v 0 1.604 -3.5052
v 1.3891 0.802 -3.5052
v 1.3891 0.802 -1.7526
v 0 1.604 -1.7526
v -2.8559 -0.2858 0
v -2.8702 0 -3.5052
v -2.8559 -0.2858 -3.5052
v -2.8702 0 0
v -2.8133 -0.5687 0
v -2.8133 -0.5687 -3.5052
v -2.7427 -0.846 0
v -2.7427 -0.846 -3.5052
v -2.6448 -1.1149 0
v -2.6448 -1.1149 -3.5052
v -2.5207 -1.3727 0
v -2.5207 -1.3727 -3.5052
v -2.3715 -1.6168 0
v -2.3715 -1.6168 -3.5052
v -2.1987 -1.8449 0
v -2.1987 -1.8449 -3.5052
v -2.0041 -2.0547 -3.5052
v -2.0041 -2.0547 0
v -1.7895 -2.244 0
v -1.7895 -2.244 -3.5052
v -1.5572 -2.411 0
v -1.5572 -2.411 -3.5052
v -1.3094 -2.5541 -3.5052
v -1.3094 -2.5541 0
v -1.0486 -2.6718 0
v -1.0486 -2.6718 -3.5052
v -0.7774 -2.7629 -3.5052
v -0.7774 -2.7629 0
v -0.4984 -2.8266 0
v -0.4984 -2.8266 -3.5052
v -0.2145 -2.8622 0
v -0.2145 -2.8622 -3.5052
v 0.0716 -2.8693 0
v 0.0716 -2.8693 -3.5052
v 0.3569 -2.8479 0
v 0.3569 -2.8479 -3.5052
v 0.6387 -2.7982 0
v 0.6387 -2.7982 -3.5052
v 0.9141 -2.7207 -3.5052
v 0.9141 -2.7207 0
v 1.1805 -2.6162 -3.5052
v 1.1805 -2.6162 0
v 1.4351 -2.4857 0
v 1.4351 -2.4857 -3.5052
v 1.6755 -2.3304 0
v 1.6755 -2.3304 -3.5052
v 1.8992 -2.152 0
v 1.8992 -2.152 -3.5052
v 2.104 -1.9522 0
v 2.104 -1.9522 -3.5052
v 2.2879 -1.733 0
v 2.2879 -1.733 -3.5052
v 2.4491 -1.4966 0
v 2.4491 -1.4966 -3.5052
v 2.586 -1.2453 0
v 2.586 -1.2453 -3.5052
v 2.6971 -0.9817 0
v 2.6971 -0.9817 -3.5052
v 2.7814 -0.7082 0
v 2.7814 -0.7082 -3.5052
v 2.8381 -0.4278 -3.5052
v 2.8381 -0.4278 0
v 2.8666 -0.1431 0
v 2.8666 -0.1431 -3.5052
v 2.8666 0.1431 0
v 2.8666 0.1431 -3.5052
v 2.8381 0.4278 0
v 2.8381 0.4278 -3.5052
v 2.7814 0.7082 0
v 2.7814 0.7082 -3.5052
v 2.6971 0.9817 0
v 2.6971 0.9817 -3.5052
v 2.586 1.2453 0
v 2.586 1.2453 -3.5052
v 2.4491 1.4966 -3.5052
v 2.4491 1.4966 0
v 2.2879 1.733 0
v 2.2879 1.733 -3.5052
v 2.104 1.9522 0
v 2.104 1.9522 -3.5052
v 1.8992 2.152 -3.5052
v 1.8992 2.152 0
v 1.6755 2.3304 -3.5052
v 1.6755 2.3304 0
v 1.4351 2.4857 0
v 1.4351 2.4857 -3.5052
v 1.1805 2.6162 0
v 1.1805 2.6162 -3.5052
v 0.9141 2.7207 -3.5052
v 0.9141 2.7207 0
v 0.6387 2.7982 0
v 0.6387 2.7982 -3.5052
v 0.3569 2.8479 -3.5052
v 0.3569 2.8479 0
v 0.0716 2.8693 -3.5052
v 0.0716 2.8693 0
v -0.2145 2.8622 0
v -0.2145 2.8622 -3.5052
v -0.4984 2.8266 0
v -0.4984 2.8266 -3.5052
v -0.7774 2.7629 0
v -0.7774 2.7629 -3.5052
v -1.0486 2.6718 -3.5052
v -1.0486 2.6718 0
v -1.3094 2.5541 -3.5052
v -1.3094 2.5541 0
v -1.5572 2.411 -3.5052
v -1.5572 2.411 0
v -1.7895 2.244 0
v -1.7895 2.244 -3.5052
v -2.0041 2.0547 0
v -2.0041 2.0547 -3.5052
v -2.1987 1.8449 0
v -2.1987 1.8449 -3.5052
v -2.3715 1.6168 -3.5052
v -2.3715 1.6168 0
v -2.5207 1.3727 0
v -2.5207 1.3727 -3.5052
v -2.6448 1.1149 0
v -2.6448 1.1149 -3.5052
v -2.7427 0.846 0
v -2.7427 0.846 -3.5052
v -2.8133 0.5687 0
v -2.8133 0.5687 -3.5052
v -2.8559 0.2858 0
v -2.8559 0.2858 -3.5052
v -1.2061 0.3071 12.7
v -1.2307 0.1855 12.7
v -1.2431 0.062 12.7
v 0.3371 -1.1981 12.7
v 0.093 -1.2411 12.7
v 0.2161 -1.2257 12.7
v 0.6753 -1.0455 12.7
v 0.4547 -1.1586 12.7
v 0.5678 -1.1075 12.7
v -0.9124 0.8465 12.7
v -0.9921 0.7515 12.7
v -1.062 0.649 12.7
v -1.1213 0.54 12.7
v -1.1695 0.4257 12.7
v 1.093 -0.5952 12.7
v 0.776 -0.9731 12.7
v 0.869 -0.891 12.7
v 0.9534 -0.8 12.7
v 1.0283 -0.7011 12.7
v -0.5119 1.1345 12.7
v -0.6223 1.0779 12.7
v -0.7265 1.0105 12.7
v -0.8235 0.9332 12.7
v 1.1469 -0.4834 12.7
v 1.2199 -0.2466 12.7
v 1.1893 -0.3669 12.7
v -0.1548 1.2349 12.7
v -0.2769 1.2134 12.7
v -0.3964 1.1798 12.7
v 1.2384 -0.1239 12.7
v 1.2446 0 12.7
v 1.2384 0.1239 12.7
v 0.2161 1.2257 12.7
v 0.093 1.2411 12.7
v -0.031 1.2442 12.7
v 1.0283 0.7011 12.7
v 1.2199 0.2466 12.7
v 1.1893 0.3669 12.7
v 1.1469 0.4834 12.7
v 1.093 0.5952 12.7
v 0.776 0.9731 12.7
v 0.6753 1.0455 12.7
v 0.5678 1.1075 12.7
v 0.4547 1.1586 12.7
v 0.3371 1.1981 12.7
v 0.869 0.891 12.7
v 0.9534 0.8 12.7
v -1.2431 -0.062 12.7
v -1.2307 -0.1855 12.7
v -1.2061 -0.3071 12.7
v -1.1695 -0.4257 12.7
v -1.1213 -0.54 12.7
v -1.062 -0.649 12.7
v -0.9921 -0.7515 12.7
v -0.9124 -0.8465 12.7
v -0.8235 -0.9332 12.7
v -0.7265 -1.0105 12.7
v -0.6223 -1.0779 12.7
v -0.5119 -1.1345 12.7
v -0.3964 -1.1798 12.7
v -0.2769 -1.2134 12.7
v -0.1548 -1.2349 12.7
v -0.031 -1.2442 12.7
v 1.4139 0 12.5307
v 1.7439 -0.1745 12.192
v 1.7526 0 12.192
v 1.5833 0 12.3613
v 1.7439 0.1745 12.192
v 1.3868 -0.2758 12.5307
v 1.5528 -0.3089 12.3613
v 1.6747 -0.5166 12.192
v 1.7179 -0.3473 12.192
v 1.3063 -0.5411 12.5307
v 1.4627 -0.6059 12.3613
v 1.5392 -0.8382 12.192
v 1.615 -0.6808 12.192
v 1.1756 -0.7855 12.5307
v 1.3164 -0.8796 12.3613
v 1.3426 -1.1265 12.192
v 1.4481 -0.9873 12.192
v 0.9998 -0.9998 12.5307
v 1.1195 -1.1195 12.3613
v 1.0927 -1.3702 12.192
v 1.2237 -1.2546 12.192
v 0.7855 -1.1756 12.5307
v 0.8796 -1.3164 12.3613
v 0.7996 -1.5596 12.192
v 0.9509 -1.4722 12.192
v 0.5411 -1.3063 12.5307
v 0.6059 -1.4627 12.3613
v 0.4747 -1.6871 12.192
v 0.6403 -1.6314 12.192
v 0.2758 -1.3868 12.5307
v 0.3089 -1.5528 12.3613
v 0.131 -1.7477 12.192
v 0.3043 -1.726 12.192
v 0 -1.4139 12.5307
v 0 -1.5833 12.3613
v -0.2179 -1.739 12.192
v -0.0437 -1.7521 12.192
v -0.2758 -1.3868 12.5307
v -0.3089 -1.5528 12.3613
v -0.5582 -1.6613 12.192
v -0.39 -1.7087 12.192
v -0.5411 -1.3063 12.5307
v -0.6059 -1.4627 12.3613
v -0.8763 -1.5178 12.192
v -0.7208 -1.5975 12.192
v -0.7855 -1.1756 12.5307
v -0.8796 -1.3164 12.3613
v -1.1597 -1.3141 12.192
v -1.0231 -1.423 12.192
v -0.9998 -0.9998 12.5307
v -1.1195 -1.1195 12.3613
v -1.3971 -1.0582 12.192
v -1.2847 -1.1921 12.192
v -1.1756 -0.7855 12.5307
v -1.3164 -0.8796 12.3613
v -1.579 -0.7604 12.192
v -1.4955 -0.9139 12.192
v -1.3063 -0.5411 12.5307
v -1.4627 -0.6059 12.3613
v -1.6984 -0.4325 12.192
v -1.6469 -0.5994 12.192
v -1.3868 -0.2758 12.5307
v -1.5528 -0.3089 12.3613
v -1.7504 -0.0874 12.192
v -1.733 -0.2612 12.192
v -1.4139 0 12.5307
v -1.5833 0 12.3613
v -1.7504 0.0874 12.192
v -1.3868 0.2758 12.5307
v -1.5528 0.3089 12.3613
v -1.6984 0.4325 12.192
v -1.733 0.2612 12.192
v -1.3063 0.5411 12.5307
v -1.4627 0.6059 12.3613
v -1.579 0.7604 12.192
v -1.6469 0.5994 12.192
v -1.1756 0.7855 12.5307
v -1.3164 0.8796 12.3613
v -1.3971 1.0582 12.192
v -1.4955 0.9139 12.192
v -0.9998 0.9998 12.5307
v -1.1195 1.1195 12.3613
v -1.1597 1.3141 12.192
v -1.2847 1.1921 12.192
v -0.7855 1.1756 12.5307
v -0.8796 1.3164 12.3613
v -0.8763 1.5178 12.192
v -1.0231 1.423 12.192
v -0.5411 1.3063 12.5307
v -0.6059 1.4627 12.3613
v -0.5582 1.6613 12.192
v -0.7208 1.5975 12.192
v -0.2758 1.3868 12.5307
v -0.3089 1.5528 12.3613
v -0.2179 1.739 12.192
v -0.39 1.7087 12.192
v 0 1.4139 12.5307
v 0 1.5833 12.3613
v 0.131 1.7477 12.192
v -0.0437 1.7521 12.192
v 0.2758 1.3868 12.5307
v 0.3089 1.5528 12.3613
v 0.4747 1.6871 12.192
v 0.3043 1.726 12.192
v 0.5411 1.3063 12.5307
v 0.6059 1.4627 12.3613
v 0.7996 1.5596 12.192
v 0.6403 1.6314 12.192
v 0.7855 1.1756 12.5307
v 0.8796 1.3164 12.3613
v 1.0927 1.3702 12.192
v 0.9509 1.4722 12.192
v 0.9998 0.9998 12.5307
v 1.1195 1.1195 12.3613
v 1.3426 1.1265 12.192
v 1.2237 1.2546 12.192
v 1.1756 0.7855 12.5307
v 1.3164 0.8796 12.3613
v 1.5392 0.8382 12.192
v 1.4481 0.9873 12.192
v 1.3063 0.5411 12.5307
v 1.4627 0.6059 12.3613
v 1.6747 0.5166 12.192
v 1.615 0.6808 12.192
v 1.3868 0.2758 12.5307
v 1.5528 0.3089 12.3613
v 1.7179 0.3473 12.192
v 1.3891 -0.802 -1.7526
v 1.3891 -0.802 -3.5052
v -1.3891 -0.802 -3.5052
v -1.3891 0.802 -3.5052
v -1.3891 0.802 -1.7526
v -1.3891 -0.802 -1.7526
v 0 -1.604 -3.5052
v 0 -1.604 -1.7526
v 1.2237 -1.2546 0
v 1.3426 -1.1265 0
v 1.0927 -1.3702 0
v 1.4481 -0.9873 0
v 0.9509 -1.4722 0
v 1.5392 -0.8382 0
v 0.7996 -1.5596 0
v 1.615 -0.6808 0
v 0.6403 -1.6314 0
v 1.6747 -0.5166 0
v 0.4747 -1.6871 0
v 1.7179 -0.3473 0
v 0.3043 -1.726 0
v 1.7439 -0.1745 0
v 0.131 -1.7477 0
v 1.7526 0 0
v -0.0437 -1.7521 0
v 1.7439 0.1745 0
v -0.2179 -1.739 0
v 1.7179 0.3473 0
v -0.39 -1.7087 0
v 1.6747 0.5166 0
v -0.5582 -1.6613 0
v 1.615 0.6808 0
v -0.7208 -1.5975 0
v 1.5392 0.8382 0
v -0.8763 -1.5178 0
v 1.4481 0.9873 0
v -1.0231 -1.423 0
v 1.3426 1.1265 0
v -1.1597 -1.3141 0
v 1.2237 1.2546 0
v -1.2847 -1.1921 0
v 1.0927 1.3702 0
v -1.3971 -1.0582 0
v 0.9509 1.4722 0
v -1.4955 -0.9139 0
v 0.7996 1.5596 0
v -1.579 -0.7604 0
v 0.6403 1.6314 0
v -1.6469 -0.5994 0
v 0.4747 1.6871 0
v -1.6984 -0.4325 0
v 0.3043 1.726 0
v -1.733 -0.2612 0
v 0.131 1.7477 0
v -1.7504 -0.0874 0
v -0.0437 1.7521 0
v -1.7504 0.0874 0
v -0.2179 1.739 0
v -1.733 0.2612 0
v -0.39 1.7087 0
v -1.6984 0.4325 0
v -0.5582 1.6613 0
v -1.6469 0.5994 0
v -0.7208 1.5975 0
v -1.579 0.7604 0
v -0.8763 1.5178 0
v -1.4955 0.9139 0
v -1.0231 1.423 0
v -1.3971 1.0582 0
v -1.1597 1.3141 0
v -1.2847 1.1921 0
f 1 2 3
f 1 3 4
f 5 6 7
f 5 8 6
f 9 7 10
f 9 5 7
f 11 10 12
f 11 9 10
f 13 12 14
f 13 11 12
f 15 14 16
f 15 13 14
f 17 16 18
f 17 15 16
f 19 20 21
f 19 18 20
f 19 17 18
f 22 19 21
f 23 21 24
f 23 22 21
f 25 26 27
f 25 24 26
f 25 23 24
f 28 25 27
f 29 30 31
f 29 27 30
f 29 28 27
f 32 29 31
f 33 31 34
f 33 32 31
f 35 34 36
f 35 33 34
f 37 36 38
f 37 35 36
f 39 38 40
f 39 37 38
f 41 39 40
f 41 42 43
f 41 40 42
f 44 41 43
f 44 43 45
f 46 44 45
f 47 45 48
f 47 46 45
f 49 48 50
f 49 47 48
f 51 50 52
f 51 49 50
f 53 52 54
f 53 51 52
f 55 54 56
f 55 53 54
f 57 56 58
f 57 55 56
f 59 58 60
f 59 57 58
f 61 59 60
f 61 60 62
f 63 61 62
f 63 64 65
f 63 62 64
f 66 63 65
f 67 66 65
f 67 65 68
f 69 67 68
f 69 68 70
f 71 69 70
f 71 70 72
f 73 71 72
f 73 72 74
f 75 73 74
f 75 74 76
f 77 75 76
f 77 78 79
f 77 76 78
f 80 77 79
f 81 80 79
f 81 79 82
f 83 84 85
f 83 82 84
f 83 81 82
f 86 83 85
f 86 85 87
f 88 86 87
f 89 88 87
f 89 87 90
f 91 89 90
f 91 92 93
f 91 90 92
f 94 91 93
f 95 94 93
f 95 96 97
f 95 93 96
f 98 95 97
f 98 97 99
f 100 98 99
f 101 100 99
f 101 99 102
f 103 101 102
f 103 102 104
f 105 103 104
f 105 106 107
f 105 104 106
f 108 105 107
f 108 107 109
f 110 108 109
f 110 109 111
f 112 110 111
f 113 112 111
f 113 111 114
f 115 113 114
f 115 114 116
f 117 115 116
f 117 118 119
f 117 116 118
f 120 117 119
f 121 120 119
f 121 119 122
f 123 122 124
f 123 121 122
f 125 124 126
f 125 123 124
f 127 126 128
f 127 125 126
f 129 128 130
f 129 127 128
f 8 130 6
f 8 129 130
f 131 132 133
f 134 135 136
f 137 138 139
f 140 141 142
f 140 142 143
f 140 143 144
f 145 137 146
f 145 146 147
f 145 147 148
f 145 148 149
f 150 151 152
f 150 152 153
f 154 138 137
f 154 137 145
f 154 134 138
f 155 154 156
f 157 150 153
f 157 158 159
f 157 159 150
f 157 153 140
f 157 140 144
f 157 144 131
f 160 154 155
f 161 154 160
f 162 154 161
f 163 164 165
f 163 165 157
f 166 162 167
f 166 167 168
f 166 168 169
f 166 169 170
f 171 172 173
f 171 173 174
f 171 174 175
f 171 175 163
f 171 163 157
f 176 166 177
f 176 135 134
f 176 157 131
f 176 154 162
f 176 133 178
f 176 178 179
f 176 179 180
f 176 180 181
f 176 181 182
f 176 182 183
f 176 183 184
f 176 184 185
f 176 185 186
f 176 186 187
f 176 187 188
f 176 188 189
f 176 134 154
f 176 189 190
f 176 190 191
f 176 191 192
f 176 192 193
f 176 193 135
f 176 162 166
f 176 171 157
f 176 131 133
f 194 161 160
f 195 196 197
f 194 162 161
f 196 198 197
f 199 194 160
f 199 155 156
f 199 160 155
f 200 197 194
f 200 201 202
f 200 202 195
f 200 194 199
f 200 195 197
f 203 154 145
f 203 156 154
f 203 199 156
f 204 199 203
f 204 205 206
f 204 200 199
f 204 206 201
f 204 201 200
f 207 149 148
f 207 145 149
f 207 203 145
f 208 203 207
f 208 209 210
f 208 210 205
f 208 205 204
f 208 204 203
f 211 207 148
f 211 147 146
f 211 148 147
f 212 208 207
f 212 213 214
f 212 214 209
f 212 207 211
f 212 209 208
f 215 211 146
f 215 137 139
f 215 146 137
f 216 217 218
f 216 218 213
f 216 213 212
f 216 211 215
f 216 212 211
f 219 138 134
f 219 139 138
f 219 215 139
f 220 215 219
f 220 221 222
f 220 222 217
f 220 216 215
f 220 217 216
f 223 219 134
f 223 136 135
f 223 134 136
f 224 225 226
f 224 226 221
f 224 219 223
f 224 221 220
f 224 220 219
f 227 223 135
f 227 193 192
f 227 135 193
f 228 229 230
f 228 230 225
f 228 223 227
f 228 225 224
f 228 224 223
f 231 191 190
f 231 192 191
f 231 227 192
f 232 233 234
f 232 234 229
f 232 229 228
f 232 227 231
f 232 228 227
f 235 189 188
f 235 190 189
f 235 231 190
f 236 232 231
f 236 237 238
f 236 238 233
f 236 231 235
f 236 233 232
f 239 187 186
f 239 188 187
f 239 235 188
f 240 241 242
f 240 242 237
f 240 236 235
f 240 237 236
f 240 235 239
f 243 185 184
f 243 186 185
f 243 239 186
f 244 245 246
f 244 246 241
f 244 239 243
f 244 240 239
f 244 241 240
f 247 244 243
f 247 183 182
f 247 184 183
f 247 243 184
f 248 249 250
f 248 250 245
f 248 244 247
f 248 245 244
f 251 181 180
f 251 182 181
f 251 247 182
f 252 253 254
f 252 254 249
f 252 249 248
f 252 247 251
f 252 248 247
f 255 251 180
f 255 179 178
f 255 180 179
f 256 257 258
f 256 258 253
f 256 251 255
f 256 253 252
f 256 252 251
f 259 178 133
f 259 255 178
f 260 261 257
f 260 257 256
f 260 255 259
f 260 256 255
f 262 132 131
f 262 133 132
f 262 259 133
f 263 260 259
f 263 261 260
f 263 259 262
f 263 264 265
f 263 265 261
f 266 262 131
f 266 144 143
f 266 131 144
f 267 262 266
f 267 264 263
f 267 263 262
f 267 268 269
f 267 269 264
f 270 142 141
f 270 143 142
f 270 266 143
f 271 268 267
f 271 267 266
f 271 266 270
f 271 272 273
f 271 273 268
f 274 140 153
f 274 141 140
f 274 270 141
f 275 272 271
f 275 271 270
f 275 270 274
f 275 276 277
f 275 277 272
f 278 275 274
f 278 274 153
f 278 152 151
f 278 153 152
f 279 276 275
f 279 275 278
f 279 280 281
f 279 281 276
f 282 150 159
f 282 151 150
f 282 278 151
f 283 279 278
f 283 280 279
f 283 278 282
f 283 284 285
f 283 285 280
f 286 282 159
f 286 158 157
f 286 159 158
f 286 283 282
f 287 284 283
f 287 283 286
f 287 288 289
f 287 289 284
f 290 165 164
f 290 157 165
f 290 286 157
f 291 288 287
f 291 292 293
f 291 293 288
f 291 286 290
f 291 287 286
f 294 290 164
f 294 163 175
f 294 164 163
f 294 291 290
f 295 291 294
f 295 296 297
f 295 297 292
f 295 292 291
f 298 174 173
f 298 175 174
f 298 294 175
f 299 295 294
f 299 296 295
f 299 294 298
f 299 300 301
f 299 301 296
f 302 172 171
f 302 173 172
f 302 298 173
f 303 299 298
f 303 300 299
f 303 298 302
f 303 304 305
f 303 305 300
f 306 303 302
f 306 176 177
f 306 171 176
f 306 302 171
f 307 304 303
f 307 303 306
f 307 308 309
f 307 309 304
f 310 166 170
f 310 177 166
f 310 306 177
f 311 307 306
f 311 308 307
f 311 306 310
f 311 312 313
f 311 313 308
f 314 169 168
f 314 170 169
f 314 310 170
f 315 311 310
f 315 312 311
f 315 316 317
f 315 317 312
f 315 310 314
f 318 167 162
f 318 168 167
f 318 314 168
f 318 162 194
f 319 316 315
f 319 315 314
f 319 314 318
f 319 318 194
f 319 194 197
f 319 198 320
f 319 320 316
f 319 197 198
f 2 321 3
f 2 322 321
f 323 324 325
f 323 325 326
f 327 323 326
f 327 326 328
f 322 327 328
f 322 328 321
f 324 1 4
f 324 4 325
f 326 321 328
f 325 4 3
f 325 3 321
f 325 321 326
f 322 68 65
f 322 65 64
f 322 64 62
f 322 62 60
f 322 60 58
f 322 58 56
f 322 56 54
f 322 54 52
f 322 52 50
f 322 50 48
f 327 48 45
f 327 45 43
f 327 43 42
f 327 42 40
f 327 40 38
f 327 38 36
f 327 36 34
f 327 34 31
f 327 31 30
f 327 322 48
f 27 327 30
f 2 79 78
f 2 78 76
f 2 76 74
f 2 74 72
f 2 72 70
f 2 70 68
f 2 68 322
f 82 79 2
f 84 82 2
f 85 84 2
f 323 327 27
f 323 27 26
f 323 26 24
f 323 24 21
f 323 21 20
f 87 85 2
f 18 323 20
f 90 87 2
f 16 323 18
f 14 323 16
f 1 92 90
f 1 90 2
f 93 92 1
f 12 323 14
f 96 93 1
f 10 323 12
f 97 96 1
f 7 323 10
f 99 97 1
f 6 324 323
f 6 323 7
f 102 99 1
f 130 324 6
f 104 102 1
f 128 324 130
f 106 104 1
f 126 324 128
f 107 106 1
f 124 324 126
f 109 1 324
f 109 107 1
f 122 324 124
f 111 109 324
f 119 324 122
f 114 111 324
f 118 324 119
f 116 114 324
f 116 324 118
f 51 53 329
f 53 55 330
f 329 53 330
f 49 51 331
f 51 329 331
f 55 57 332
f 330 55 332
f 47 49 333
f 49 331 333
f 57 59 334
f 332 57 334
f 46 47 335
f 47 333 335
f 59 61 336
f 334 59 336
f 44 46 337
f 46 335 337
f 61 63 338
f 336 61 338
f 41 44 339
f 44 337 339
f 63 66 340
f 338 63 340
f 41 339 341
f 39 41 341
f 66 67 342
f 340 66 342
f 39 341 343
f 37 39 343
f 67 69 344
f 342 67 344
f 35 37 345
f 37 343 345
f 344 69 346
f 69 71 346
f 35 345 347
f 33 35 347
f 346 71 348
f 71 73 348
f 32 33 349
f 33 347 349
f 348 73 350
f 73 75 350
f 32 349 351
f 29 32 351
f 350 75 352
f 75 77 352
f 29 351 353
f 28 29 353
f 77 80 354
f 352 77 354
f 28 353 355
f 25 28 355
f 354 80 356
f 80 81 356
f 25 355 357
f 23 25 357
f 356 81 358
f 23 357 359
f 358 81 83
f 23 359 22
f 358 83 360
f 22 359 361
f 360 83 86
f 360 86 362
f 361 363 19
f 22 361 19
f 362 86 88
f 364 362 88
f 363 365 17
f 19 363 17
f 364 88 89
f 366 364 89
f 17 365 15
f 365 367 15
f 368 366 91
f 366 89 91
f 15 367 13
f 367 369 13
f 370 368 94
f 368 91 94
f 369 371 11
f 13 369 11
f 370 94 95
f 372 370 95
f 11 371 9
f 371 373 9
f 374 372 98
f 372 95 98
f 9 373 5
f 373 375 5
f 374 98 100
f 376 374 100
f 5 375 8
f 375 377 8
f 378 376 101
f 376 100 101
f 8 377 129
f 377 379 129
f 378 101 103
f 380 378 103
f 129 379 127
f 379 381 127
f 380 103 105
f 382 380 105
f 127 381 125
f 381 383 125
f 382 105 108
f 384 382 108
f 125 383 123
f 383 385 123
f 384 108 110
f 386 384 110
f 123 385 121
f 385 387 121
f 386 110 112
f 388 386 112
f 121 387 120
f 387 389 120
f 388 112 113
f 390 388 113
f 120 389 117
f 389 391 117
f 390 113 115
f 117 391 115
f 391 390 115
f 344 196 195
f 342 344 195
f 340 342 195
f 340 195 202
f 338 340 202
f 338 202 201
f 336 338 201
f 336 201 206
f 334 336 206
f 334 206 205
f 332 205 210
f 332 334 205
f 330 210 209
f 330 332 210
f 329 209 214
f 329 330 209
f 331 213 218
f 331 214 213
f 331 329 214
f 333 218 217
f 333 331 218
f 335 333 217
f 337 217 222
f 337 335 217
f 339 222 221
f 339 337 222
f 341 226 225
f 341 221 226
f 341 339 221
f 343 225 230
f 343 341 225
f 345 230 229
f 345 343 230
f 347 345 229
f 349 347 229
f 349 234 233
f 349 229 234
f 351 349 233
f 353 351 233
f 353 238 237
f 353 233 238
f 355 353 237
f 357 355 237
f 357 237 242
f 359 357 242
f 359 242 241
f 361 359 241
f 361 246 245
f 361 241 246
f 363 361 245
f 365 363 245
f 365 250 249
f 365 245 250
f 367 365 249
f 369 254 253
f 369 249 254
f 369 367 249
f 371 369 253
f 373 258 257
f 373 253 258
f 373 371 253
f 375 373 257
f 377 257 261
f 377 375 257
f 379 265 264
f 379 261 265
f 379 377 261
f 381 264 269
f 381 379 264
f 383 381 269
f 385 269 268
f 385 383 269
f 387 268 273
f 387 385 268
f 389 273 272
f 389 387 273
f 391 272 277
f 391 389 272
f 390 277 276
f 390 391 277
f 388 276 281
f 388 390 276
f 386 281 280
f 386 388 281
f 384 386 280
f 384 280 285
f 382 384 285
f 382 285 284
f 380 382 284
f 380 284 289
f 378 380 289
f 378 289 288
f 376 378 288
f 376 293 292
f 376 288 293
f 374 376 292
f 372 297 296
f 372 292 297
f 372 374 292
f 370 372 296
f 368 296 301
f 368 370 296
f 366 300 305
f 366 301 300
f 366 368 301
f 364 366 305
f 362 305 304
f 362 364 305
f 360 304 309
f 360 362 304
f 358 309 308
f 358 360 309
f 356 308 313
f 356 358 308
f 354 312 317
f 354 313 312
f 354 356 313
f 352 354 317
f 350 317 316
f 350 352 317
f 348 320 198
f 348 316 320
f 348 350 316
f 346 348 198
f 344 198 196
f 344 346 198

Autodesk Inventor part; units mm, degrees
ref_plane "YZ Plane" through (0, 0, 0) normal (1, 0, 0) x (0, 1, 0)
ref_plane "XZ Plane" through (0, 0, 0) normal (0, 1, 0) x (-1, 0, 0)
ref_plane "XY Plane" through (0, 0, 0) normal (0, 0, 1) x (1, 0, 0)
sketch "Sketch1" plane through (0, 0, 0) normal (0, 0, 1) x (1, 0, 0)
  circle A0 centre (0, 0) radius 1.7526
  dimension "d0" = 3.5052
extrude "Extrusion1" add sketch "Sketch1" along normal blind 12.7
sketch "Sketch2" plane through (0, 0, 0) normal (0, 0, -1) x (-1, 0, 0)
  circle A0 centre (0, 0) radius 1.7526 construction
  circle A1 centre (0, 0) radius 2.8702
  dimension "d3" = 5.7404
extrude "Extrusion2" add sketch "Sketch2" along normal blind 3.5052
sketch "Sketch3" plane through (0, 0, -3.5052) normal (0, 0, -1) x (-1, 0, 0)
  circle A0 centre (0, 0) radius 2.8702 projected
  line L0 (0, 1.604) -> (1.3891, 0.802)
  line L1 (1.3891, 0.802) -> (1.3891, -0.802)
  line L2 (1.3891, -0.802) -> (0, -1.604)
  line L3 (0, -1.604) -> (-1.3891, -0.802)
  line L4 (-1.3891, -0.802) -> (-1.3891, 0.802)
  line L5 (-1.3891, 0.802) -> (0, 1.604)
  dimension "d6" = 2.7781
extrude "Extrusion3" cut sketch "Sketch3" against normal blind 1.7526 contours L0 L1 L2 L3 L4 L5
thread "Thread1" size "6-32 UNC" class "2A" standard "ANSI Unified Screw Threads" full length
chamfer "Chamfer1" distance 0.508 angle 45 1 edges at (-1.7526, 0, 12.7)
properties part number "6-32 SHCS x500" material "Stainless Steel"
